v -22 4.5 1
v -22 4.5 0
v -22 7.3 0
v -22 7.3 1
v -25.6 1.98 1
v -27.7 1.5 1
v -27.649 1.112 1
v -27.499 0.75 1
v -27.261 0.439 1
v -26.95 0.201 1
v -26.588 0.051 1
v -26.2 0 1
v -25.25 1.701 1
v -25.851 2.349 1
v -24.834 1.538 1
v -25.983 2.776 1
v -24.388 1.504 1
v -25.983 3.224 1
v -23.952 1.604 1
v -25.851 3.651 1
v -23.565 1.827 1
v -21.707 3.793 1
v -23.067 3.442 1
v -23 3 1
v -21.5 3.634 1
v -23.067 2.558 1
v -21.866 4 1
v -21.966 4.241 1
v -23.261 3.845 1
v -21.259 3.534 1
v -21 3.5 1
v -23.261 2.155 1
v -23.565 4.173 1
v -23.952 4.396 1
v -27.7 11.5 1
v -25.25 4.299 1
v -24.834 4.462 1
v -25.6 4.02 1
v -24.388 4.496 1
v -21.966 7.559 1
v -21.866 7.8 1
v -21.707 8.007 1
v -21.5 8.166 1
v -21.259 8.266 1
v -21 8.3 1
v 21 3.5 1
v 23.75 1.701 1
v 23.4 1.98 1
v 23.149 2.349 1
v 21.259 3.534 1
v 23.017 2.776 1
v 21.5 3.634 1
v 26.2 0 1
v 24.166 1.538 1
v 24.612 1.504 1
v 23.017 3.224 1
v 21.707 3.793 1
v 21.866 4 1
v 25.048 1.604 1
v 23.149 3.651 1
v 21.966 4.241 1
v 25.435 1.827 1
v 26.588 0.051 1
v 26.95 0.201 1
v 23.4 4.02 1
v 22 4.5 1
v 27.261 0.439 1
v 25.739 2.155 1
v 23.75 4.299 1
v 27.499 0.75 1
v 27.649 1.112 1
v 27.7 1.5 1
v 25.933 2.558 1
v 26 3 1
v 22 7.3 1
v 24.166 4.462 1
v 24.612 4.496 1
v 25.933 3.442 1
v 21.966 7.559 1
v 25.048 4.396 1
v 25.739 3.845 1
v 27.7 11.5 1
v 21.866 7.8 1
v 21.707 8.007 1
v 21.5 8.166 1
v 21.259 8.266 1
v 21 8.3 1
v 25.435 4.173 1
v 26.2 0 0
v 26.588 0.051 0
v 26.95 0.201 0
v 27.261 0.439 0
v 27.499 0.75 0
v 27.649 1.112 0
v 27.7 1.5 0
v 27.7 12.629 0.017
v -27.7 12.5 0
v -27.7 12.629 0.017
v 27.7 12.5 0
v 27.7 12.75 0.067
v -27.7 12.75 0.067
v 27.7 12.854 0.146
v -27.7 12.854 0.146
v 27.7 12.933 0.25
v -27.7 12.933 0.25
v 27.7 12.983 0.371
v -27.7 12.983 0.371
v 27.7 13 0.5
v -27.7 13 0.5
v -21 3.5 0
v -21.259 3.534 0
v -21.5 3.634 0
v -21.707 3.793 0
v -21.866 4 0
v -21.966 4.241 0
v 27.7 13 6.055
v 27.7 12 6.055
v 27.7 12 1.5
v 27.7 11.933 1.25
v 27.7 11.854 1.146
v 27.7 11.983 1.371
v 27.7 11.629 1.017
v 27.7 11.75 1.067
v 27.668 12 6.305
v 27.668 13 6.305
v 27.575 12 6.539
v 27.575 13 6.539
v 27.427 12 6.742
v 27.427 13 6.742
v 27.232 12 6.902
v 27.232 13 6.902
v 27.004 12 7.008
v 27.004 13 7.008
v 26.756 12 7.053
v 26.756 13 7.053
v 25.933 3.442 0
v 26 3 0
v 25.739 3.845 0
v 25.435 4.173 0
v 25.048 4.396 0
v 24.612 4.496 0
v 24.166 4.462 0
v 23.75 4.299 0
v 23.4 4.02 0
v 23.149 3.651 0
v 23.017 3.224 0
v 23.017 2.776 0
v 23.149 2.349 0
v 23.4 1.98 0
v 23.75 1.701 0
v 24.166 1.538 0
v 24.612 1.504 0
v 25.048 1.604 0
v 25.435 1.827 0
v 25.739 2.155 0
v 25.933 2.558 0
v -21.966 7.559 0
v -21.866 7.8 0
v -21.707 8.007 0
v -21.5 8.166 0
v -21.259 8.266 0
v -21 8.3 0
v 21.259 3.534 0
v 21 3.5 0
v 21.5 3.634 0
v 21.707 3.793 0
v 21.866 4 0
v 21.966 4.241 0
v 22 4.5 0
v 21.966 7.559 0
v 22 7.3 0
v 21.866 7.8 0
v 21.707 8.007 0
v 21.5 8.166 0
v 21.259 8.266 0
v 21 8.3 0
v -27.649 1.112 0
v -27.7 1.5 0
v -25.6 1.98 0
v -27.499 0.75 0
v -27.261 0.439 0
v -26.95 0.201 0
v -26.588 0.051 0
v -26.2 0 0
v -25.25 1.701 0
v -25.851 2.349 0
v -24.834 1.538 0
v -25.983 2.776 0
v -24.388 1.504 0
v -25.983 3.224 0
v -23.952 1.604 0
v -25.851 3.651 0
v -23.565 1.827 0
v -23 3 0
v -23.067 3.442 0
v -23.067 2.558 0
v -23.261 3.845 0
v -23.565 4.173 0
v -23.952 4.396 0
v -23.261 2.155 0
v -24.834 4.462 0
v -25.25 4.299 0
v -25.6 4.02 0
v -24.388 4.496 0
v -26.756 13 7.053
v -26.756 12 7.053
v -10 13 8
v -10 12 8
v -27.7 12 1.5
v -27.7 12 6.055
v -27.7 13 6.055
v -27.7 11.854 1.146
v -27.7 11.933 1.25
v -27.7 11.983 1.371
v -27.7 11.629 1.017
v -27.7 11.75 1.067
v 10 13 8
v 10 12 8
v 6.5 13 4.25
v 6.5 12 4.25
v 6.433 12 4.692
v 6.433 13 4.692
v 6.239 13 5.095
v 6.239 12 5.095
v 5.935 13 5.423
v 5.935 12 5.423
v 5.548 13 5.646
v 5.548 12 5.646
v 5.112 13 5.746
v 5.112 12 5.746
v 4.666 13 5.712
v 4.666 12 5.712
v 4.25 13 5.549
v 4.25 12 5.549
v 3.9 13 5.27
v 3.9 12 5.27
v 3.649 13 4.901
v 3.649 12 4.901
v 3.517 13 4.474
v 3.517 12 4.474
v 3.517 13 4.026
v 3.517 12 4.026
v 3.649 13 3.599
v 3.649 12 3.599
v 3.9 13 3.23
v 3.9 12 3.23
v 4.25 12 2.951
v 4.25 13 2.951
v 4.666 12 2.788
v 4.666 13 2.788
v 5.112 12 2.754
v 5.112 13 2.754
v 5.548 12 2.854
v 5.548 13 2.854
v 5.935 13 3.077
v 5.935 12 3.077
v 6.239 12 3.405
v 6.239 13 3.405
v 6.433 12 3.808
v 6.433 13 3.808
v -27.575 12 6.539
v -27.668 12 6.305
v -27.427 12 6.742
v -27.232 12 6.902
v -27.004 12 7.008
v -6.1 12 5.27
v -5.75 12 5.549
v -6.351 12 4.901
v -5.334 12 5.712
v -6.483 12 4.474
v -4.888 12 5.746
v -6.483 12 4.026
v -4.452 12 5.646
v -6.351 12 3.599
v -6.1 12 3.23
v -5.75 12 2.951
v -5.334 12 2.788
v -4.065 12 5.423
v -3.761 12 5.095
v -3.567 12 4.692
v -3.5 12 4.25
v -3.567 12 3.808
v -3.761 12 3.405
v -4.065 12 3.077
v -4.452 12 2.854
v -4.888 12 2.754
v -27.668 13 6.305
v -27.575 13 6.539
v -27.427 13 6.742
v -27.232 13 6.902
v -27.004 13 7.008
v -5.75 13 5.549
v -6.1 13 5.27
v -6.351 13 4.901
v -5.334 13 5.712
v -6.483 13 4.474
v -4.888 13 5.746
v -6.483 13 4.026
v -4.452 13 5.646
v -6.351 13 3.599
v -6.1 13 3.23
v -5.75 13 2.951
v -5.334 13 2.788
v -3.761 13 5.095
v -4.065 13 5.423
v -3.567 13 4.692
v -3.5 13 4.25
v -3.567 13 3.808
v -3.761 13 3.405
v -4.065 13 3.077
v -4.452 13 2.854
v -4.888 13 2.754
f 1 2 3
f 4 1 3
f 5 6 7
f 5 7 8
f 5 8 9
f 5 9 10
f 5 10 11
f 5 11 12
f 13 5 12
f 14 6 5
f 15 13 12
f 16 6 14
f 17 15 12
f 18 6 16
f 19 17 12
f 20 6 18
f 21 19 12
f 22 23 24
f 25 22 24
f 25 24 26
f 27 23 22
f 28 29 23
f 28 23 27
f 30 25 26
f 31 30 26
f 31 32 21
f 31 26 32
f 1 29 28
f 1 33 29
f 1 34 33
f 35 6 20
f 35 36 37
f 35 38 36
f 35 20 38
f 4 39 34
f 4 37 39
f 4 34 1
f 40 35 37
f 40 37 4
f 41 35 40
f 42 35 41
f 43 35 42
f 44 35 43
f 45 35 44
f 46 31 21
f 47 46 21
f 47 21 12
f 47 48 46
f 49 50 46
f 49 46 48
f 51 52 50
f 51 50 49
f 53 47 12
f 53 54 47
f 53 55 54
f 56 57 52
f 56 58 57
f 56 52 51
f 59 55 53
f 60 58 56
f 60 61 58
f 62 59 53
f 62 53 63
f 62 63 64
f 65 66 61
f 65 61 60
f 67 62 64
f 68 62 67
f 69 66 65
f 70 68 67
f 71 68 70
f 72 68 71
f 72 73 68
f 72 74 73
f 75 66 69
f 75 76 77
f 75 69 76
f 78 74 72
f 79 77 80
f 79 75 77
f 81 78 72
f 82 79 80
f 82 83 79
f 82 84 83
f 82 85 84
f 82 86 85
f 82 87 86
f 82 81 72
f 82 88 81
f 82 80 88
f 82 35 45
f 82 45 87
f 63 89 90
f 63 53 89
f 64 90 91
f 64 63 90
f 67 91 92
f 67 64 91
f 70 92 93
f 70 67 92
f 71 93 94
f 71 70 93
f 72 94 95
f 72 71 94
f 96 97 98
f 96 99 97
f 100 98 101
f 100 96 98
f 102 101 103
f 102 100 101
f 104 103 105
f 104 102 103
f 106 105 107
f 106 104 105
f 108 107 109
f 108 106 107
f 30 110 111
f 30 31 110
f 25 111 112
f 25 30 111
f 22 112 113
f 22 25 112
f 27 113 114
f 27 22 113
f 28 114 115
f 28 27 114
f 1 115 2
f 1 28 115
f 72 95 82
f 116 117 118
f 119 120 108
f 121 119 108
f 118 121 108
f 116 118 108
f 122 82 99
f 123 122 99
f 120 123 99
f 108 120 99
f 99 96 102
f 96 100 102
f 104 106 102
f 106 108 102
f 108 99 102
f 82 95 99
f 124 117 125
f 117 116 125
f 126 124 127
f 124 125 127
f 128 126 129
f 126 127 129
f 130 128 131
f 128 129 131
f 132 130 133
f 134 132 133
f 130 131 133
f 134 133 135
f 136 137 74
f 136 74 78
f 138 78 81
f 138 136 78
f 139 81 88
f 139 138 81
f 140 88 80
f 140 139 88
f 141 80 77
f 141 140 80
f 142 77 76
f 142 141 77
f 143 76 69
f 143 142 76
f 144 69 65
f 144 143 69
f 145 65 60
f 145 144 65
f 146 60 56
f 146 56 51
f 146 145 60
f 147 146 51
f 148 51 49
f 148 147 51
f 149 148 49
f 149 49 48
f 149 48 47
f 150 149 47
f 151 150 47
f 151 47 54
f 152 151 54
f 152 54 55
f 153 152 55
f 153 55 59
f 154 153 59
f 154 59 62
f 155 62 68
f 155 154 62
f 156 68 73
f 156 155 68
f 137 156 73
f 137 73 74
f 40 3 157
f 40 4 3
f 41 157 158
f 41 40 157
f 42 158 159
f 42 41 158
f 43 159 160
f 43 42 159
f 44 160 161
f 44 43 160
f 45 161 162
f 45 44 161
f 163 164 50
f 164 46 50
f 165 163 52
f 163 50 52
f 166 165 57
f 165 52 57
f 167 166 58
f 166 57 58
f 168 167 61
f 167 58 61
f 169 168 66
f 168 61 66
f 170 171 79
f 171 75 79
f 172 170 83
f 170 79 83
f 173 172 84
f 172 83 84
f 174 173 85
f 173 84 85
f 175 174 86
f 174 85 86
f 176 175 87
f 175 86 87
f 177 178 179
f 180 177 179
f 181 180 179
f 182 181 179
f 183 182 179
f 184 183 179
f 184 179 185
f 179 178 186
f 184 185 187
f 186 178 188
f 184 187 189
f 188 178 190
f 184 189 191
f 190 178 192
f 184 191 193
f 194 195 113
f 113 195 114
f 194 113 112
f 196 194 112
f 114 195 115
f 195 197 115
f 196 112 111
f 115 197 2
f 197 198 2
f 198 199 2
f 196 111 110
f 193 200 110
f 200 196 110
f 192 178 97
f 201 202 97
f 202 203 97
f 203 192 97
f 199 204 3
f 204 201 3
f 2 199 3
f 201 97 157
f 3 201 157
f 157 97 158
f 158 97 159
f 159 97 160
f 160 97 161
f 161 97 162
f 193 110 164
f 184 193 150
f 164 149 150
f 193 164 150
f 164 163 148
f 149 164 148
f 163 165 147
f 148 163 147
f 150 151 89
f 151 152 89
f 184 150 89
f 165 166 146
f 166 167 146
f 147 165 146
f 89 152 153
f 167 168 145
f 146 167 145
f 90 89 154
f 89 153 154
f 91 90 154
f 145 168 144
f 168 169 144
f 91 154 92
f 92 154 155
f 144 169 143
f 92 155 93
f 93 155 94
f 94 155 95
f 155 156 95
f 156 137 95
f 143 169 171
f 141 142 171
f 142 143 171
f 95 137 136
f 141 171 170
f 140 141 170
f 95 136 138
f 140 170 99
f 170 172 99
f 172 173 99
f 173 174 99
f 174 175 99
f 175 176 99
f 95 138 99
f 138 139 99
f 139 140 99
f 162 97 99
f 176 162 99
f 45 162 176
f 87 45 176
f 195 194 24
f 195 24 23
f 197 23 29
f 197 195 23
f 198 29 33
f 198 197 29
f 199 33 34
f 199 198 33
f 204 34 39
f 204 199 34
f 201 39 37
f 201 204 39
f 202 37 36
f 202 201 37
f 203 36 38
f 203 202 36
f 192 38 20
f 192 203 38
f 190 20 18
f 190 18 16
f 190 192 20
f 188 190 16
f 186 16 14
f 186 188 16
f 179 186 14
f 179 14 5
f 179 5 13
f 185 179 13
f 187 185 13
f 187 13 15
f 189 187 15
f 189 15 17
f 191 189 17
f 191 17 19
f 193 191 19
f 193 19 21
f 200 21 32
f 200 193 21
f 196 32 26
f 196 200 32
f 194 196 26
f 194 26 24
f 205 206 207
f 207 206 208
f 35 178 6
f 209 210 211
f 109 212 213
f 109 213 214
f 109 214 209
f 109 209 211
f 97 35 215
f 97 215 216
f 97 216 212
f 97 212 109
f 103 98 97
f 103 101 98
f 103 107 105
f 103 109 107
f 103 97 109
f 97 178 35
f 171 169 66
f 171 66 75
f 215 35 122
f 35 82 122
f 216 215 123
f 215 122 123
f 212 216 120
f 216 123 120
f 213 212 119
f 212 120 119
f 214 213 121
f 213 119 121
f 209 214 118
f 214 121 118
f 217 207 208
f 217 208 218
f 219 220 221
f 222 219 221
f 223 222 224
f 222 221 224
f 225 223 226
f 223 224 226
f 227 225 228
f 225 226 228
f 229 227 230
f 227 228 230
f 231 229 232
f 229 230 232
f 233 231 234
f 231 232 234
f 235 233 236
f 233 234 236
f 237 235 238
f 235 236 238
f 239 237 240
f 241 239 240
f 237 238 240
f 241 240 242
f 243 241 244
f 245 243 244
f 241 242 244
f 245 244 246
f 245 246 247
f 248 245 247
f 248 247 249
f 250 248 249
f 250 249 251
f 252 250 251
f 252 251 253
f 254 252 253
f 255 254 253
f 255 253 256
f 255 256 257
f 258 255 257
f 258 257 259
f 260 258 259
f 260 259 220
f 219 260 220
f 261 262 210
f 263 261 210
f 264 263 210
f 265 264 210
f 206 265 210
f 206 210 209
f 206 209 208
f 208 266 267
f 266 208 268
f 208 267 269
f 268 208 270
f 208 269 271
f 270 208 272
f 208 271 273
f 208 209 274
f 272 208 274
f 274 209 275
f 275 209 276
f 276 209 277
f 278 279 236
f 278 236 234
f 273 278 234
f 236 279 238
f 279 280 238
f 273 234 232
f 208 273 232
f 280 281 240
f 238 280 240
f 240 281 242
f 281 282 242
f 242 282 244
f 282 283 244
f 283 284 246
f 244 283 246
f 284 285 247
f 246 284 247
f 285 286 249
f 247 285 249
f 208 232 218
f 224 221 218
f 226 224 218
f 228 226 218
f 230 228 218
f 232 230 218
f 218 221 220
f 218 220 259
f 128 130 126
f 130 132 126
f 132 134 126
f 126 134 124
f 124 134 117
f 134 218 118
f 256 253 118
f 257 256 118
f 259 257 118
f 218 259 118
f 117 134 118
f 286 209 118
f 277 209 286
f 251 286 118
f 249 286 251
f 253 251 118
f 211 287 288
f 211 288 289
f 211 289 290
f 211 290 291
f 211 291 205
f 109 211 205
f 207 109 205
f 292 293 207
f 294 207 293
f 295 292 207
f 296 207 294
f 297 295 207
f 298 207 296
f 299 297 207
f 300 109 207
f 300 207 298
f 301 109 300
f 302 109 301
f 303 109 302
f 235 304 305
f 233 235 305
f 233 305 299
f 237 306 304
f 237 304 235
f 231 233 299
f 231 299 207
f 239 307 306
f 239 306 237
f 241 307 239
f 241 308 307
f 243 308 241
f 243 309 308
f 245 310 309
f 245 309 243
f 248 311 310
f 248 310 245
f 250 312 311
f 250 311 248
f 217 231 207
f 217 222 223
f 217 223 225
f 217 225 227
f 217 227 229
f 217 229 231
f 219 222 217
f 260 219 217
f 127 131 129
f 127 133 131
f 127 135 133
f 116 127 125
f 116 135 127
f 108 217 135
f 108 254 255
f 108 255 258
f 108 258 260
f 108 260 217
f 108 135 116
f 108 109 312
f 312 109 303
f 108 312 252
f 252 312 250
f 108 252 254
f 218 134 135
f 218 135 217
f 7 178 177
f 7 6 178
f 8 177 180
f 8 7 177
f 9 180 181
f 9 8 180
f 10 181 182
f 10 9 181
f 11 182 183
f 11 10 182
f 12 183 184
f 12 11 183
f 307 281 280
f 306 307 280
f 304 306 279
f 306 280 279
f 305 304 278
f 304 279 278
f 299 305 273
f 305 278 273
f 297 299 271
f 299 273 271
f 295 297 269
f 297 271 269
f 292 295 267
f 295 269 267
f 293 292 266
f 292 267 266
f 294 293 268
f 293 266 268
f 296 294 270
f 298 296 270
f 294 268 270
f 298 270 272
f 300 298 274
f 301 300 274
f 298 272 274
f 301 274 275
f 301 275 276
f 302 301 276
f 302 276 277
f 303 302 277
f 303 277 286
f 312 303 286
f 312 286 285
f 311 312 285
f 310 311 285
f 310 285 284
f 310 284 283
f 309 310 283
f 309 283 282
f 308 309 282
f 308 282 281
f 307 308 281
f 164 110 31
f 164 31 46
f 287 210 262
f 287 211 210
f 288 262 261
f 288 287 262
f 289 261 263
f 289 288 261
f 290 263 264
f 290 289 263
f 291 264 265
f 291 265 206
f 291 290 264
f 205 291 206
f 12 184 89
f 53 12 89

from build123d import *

# Parameters (mm, degrees)
SKETCH_1_W          = 55.4
SKETCH_1_H          = 13
SKETCH_1_R          = 1.5
SKETCH_1_W_2        = 44
SKETCH_1_H_2        = 4.8
EXTRUDE_1_DEPTH     = 1
SKETCH_2_W          = 55.4
SKETCH_2_H          = 1
EXTRUDE_2_DEPTH     = 7
CUT_EXTRUDE_1_DEPTH = 2
SKETCH_4_R          = 1.5
CUT_EXTRUDE_2_DEPTH = 2
FILLET_1_R          = 0.5
FILLET_2_R          = 1
FILLET_3_R          = 1.5
FILLET_4_R          = 1


with BuildPart() as part:
    # 草图1 → 凸台-拉伸1 (new body)
    with BuildSketch(Plane.XY):
        with Locations((0, 6.5)):
            Rectangle(SKETCH_1_W, SKETCH_1_H)
        with Locations((-24.5, 3)):
            Circle(SKETCH_1_R, mode=Mode.SUBTRACT)
        with Locations((24.5, 3)):
            Circle(SKETCH_1_R, mode=Mode.SUBTRACT)
        with Locations((0, 5.9)):
            Rectangle(SKETCH_1_W_2, SKETCH_1_H_2, mode=Mode.SUBTRACT)
    extrude(amount=EXTRUDE_1_DEPTH)

    # 草图2 → 凸台-拉伸2 (add)
    with BuildSketch(Plane.XY.offset(1)):
        with Locations((0, 12.5)):
            Rectangle(SKETCH_2_W, SKETCH_2_H)
    extrude(amount=EXTRUDE_2_DEPTH)

    # 草图3 → 切除-拉伸1 (cut, through all)
    with BuildSketch(Plane.XZ.offset(-12)):
        Polygon((-27.7, 8), (-27.7, 7), (-10, 8), align=None)
        Polygon((27.7, 8), (27.7, 7), (10, 8), align=None)
    extrude(amount=-CUT_EXTRUDE_1_DEPTH, mode=Mode.SUBTRACT)

    # 草图4 → 切除-拉伸2 (cut, through all)
    with BuildSketch(Plane.XZ.offset(-12)):
        with Locations((-5, 4.25)):
            Circle(SKETCH_4_R)
        with Locations((5, 4.25)):
            Circle(SKETCH_4_R)
    extrude(amount=-CUT_EXTRUDE_2_DEPTH, mode=Mode.SUBTRACT)

    # 圆角1
    fillet_1_edges = [part.edges().sort_by_distance(p)[0] for p in [
        (0, 13, 0),
        (0, 12, 1),
    ]]
    fillet(fillet_1_edges, radius=FILLET_1_R)

    # 圆角2
    fillet_2_edges = [part.edges().sort_by_distance(p)[0] for p in [
        (22, 3.5, 0.5),
        (22, 8.3, 0.5),
        (-22, 8.3, 0.5),
        (-22, 3.5, 0.5),
    ]]
    fillet(fillet_2_edges, radius=FILLET_2_R)

    # 圆角3
    fillet_3_edges = [part.edges().sort_by_distance(p)[0] for p in [
        (27.7, 0, 0.5),
        (-27.7, 0, 0.5),
    ]]
    fillet(fillet_3_edges, radius=FILLET_3_R)

    # 圆角4
    fillet_4_edges = [part.edges().sort_by_distance(p)[0] for p in [
        (-27.7, 12.5, 7),
        (27.7, 12.5, 7),
    ]]
    fillet(fillet_4_edges, radius=FILLET_4_R)


solid = part.part
